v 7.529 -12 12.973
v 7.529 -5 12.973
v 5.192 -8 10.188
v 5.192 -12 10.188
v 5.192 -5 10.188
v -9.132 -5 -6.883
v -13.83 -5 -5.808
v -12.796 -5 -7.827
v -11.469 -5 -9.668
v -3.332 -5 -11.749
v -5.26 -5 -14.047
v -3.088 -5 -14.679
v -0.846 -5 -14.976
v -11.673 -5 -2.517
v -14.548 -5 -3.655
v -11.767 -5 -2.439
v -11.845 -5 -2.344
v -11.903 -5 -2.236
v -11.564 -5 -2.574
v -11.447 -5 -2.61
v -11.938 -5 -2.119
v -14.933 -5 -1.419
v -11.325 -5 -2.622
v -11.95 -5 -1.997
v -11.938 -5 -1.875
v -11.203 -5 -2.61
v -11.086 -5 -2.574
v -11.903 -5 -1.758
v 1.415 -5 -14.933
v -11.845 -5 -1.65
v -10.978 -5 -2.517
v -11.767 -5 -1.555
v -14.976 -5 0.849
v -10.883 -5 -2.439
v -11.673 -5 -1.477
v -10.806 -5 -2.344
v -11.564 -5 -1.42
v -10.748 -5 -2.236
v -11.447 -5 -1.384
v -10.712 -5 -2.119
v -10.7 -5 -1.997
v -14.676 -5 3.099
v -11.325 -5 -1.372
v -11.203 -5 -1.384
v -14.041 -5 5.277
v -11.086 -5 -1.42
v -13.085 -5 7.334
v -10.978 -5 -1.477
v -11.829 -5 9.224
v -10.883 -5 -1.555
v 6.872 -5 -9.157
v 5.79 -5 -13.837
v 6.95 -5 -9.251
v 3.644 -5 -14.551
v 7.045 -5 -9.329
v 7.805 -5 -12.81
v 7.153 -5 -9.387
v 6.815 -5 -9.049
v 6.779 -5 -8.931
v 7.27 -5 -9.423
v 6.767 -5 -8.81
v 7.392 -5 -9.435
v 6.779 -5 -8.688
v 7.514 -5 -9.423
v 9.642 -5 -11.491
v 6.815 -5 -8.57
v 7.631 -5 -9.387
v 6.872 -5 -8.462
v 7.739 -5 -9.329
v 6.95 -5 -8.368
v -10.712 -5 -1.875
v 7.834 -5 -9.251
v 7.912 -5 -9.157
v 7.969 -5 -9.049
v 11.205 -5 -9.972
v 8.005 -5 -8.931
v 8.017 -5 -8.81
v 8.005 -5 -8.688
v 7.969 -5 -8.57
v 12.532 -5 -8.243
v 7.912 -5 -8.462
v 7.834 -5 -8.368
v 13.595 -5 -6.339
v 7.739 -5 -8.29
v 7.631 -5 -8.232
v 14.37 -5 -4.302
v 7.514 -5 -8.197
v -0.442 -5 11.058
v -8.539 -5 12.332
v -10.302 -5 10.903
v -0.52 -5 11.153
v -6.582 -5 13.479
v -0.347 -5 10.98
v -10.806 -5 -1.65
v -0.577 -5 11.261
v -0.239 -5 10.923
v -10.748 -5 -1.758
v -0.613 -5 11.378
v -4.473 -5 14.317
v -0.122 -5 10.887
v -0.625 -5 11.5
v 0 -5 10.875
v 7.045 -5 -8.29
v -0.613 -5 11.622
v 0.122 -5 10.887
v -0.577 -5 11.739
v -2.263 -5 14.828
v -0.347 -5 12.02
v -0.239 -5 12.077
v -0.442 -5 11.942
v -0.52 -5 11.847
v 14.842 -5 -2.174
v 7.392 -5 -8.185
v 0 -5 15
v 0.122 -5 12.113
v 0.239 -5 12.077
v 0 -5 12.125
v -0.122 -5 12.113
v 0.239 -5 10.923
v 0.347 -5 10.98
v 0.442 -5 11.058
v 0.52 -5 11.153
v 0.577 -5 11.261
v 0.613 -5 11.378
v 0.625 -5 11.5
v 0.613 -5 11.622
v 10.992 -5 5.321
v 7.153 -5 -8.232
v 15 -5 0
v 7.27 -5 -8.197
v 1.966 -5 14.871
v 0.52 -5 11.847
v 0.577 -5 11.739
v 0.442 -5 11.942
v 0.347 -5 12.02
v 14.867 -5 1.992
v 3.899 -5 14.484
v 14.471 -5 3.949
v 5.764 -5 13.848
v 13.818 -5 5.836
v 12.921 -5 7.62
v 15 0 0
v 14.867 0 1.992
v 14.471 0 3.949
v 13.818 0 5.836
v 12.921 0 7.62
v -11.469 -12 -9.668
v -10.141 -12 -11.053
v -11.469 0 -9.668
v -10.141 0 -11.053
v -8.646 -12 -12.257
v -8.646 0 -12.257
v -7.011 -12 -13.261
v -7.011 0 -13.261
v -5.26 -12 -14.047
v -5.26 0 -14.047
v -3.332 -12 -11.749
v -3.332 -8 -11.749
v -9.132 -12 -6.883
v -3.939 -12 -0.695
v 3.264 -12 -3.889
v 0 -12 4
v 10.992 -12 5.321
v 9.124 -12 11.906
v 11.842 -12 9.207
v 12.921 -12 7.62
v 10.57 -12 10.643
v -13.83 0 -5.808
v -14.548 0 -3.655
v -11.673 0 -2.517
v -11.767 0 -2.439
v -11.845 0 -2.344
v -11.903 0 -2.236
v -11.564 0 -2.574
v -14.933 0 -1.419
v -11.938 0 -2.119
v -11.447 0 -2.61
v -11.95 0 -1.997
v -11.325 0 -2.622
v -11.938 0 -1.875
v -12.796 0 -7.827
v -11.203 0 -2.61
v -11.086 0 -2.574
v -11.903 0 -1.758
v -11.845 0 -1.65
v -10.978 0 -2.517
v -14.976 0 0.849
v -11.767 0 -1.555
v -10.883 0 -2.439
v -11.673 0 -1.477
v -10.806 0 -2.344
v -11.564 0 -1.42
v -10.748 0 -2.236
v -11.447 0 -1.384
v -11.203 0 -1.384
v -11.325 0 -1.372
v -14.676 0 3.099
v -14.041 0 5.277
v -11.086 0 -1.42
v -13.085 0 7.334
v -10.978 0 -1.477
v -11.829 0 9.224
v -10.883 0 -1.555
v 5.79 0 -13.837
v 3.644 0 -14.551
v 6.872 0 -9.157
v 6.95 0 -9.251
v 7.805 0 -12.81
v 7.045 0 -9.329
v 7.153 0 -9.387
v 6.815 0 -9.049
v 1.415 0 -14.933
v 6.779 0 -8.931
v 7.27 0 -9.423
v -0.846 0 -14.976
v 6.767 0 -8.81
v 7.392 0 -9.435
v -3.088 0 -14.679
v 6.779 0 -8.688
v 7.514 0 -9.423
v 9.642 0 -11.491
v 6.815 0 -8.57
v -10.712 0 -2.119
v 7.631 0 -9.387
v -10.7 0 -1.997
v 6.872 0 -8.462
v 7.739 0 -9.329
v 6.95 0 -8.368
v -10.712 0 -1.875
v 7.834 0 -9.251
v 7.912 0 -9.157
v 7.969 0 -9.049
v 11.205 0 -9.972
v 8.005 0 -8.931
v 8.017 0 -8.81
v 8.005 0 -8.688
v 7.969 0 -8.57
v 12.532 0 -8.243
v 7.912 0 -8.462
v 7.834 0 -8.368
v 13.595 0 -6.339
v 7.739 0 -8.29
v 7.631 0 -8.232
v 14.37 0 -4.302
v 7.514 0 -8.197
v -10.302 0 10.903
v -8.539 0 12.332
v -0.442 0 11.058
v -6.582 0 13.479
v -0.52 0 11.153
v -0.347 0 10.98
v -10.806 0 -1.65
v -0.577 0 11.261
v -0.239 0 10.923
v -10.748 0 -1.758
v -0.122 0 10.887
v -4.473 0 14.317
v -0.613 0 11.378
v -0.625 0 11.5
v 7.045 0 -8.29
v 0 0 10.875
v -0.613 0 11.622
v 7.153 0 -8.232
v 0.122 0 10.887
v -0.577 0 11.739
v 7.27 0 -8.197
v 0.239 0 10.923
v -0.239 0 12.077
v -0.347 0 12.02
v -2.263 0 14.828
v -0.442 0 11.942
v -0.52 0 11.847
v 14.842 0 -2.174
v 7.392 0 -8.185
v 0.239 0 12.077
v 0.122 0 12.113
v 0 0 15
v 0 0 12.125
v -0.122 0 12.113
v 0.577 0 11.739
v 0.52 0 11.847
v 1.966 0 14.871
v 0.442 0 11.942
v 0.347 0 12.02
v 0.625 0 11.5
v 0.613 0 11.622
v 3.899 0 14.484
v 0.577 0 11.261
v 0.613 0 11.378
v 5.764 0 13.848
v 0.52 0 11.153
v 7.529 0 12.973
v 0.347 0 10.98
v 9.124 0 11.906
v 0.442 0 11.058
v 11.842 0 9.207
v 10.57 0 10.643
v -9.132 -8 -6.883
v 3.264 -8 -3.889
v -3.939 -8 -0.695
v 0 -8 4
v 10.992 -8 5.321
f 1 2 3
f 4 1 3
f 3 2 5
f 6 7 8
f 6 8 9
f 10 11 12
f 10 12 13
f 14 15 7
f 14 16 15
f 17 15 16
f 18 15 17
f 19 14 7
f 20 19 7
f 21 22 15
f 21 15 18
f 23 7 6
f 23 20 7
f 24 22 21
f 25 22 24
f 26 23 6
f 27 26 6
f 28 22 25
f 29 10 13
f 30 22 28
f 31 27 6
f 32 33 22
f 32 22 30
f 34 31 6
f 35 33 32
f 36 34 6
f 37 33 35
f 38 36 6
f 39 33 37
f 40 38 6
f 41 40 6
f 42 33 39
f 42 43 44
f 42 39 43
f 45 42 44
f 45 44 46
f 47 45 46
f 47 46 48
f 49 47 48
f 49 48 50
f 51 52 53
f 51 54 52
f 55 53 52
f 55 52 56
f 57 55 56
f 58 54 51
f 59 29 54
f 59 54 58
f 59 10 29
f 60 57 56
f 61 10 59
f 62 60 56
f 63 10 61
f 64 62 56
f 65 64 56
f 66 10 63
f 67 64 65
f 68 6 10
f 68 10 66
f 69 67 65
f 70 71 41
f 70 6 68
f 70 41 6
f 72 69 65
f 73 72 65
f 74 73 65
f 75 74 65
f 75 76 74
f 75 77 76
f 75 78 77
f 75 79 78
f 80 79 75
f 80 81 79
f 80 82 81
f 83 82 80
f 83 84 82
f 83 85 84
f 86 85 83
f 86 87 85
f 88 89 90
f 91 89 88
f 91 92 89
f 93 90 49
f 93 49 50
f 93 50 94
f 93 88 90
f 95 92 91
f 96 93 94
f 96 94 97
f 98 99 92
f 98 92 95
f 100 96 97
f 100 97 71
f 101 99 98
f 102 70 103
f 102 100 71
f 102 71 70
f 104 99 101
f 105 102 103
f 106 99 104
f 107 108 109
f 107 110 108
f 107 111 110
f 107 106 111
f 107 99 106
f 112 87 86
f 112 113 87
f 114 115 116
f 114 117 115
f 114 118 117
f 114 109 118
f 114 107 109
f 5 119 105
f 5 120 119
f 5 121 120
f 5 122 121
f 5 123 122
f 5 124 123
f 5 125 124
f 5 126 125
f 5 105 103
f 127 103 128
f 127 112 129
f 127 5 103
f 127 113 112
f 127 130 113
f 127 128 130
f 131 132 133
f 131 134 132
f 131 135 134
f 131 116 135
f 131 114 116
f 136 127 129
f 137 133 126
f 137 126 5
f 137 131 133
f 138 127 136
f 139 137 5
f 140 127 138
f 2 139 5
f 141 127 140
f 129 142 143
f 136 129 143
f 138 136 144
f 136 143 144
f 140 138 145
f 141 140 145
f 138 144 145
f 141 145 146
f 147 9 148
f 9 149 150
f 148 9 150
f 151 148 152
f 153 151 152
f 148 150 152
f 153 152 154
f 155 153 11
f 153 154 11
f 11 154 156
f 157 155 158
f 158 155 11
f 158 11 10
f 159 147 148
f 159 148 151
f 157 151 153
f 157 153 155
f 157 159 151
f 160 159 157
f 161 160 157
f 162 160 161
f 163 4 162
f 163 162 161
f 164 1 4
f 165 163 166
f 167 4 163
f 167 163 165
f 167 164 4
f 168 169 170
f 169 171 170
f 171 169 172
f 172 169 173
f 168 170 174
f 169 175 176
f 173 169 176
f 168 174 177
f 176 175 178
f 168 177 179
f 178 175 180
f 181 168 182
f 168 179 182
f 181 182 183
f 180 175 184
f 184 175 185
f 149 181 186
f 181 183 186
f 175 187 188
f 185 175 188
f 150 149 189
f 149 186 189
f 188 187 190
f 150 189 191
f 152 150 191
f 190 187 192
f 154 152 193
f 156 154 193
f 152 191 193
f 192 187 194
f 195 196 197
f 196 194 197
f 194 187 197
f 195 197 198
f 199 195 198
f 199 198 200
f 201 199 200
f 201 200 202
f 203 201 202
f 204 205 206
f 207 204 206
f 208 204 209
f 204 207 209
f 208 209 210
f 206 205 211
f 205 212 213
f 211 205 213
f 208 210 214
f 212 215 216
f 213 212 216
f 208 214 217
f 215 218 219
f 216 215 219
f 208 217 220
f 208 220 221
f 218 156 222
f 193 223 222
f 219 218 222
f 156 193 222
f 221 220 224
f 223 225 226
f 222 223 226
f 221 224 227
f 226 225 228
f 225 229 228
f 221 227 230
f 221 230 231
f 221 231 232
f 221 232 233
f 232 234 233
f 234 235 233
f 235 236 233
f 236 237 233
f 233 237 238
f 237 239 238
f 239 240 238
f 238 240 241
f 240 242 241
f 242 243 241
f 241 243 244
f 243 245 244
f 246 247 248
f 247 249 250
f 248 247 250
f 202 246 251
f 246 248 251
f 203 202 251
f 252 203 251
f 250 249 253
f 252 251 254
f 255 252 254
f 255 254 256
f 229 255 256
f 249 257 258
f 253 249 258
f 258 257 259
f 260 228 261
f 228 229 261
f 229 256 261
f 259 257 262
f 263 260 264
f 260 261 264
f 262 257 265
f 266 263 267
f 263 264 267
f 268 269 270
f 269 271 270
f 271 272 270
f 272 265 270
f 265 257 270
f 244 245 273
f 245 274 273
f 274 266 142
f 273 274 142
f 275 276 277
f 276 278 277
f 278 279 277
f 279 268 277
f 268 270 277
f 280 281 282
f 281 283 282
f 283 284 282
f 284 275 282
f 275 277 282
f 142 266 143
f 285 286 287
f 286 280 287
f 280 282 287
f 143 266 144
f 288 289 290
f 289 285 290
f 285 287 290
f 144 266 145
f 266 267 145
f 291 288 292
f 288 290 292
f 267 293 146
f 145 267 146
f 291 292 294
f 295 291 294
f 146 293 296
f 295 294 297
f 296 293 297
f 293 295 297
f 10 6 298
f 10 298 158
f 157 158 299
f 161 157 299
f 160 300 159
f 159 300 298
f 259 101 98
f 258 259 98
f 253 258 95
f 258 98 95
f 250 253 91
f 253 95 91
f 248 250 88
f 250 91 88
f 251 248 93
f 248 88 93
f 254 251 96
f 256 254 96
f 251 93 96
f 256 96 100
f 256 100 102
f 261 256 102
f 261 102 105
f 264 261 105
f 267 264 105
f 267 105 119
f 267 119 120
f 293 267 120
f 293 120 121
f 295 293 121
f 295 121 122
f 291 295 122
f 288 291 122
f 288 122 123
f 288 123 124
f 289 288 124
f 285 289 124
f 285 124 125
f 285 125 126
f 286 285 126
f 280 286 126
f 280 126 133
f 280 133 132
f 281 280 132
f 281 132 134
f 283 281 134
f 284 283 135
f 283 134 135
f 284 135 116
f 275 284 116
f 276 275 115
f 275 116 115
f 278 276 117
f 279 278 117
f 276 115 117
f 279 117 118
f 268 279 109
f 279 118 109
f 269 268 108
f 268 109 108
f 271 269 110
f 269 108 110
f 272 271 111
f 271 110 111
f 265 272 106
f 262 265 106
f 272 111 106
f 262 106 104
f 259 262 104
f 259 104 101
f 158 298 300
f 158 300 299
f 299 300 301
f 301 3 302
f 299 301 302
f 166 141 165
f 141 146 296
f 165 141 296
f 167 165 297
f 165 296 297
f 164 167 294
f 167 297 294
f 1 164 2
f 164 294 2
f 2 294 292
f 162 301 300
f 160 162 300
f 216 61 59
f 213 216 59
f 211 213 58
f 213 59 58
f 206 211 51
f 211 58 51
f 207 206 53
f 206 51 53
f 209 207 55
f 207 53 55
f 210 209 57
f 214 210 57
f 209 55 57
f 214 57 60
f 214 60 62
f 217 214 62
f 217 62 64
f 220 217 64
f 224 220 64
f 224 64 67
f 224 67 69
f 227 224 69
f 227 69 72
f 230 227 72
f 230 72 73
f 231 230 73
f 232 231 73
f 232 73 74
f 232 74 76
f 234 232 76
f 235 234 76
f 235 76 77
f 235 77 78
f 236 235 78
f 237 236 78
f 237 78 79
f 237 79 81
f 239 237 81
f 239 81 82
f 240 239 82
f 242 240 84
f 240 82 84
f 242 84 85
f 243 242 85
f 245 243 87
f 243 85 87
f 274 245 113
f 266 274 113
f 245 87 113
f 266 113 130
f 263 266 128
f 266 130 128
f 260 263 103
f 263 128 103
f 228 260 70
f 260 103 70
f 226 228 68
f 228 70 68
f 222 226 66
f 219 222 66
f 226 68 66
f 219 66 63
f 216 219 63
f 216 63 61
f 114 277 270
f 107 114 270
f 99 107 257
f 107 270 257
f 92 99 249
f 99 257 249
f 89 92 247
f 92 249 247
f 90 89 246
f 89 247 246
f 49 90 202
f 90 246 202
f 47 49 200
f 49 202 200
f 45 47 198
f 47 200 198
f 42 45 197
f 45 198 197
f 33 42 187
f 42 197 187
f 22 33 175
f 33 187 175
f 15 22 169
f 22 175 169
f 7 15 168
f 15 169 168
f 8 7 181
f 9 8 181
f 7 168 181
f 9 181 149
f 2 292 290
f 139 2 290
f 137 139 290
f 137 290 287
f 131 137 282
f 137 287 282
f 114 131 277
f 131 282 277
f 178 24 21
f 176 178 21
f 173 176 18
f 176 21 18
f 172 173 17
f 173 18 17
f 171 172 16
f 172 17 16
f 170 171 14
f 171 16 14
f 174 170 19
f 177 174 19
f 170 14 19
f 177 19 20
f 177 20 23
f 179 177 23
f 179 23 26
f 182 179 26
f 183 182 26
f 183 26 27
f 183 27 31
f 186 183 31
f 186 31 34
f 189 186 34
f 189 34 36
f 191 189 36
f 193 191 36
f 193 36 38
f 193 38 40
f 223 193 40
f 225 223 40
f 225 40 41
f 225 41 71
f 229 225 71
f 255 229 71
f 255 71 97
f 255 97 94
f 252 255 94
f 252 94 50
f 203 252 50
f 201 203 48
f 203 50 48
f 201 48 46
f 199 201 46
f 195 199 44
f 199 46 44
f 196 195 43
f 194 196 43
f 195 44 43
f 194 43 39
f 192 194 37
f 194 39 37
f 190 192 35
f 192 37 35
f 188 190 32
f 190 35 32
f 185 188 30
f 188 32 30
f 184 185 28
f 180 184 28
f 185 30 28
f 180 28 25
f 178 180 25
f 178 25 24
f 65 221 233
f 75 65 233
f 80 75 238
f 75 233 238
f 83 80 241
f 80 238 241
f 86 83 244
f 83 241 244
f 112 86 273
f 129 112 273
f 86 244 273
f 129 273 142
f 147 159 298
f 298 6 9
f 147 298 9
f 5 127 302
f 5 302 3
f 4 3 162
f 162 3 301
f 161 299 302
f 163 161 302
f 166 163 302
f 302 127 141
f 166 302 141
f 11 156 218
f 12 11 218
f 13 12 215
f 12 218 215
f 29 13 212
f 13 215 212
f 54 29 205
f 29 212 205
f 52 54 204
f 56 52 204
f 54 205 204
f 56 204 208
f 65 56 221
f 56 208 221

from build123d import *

# Parameters (mm, degrees)
F1_DEPTH = 12
F2_DEPTH = 8
F3_DEPTH = 5
F4_D     = 1.25


with BuildPart() as f1:
    # F0 (on Front) → F1 (new body)
    with BuildSketch(Plane.XZ):
        with BuildLine():
            Line((10.99224894, 5.3214330306), (12.920611769, 7.61956636))
            ThreePointArc((12.920611769, 7.61956636), (10.5696440554, 10.6434310512), (7.529497646, 12.9733058701))
            Line((7.529497646, 12.9733058701), (5.1924112184, 10.1880747237))
            Line((5.1924112184, 10.1880747237), (10.99224894, 5.3214330306))
        make_face()
        Polygon((3.2635182233, -3.8893095672), (10.99224894, 5.3214330306), (5.1924112184, 10.1880747237), (0, 4), (0, 0), align=None)
        Polygon((-3.939231012, -0.6945927107), (0, 0), (0, 4), align=None)
        Polygon((-3.3318045088, -11.7493091275), (3.2635182233, -3.8893095672), (0, 0), (-3.939231012, -0.6945927107), (-9.1316422304, -6.8826674344), align=None)
        with BuildLine():
            ThreePointArc((-11.4687286581, -9.6678985807), (-8.6463339891, -12.2572798185), (-5.2601673378, -14.0474424568))
            Line((-5.2601673378, -14.0474424568), (-3.3318045088, -11.7493091275))
            Line((-3.3318045088, -11.7493091275), (-9.1316422304, -6.8826674344))
            Line((-9.1316422304, -6.8826674344), (-11.4687286581, -9.6678985807))
        make_face()
    extrude(amount=F1_DEPTH)

    # F0 (on Front) → F2 (cut)
    with BuildSketch(Plane.XZ):
        Polygon((-3.939231012, -0.6945927107), (0, 0), (0, 4), align=None)
        Polygon((3.2635182233, -3.8893095672), (10.99224894, 5.3214330306), (5.1924112184, 10.1880747237), (0, 4), (0, 0), align=None)
        Polygon((-3.3318045088, -11.7493091275), (3.2635182233, -3.8893095672), (0, 0), (-3.939231012, -0.6945927107), (-9.1316422304, -6.8826674344), align=None)
    extrude(amount=F2_DEPTH, mode=Mode.SUBTRACT)

    # F0 (on Front) → F3 (join)
    with BuildSketch(Plane.XZ):
        with BuildLine():
            Line((5.1924112184, 10.1880747237), (7.529497646, 12.9733058701))
            ThreePointArc((7.529497646, 12.9733058701), (3.8987441535, 14.4844673366), (0, 15))
            Line((0, 15), (0, 4))
            Line((0, 4), (5.1924112184, 10.1880747237))
        make_face()
        Polygon((3.2635182233, -3.8893095672), (10.99224894, 5.3214330306), (5.1924112184, 10.1880747237), (0, 4), (0, 0), align=None)
        with BuildLine():
            Line((0, 4), (0, 15))
            ThreePointArc((0, 15), (-11.4906666468, 9.6418141453), (-14.7721162952, -2.604722665))
            Line((-14.7721162952, -2.604722665), (-3.939231012, -0.6945927107))
            Line((-3.939231012, -0.6945927107), (0, 4))
        make_face()
        with BuildLine():
            ThreePointArc((-14.7721162952, -2.604722665), (-13.5874059139, -6.3547148269), (-11.4687286581, -9.6678985807))
            Line((-11.4687286581, -9.6678985807), (-9.1316422304, -6.8826674344))
            Line((-9.1316422304, -6.8826674344), (-3.939231012, -0.6945927107))
            Line((-3.939231012, -0.6945927107), (-14.7721162952, -2.604722665))
        make_face()
        Polygon((-3.3318045088, -11.7493091275), (3.2635182233, -3.8893095672), (0, 0), (-3.939231012, -0.6945927107), (-9.1316422304, -6.8826674344), align=None)
        Polygon((-3.939231012, -0.6945927107), (0, 0), (0, 4), align=None)
        with BuildLine():
            ThreePointArc((9.6418141453, -11.4906666468), (13.5946168055, -6.3392739261), (15, 0))
            ThreePointArc((15, 0), (14.4708185072, 3.949102649), (12.920611769, 7.61956636))
            Line((12.920611769, 7.61956636), (10.99224894, 5.3214330306))
            Line((10.99224894, 5.3214330306), (3.2635182233, -3.8893095672))
            Line((3.2635182233, -3.8893095672), (9.6418141453, -11.4906666468))
        make_face()
        with BuildLine():
            ThreePointArc((-5.2601673378, -14.0474424568), (2.5365296809, -14.7839783948), (9.6418141453, -11.4906666468))
            Line((9.6418141453, -11.4906666468), (3.2635182233, -3.8893095672))
            Line((3.2635182233, -3.8893095672), (-3.3318045088, -11.7493091275))
            Line((-3.3318045088, -11.7493091275), (-5.2601673378, -14.0474424568))
        make_face()
    extrude(amount=F3_DEPTH)

    # F4 (through all)
    with Locations(Plane(origin=(0, 0, 0), x_dir=(1, 0, 0), z_dir=(0, 1, 0))):
        with Locations((7.3920575114, 8.8095110959), (-11.3252891596, 1.9969540432), (0, -11.5)):
            Hole(F4_D / 2)


solid = f1.part
